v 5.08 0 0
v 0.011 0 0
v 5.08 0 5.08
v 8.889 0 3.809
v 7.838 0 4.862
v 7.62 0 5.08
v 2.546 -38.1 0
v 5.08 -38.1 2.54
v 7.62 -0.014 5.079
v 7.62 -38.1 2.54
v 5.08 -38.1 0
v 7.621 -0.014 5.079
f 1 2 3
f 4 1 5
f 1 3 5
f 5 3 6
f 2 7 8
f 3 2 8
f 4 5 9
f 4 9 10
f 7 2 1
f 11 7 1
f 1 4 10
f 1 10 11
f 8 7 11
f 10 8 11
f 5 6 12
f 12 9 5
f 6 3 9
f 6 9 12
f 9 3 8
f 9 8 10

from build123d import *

# Parameters (mm, degrees)
F0_W        = 10.16
F0_H        = 5.08
F1_DEPTH    = 38.1
F2_SIZE2    = 2.53999
F2_SIZE     = 38.09999
F3_T1_DEPTH = 64.3128613158
F4_T1_DEPTH = 13.0641595789
F4_T3_DEPTH = 44.702137425
F5_T1_DEPTH = 64.1438766671


# Not quite as in the source:
# - a fillet or chamfer that OpenCascade refuses, or shapes differently, is made with other operations: its cross-section is extruded or revolved along the edge and cut away or added
# - a fillet or chamfer is up to 0.001 mm smaller than in the source, because OpenCascade refuses the exact size


with BuildPart() as f1:
    # F0 (on Front) → F1 (new body)
    with BuildSketch(Plane.XZ):
        with Locations((5.08, 2.54)):
            Rectangle(F0_W, F0_H)
    extrude(amount=F1_DEPTH)

    # F2 (size 38.1 and 2.54 in the source; OpenCascade refuses exactly that, so slightly less here)
    f2_edges = [f1.edges().sort_by_distance(p)[0] for p in [
        (5.08, -38.1, 5.08),
    ]]
    f2_side = f1.faces().sort_by_distance((5.08, -19.05, 5.08))[0]
    chamfer(f2_edges, length=F2_SIZE, length2=F2_SIZE2, reference=f2_side)

    # F3: chamfer of 5.08 on 1 edges, made by hand

    # F3_s2 → F3_t1 (cut)
    with BuildSketch(Plane(origin=(0, 13.3723717196, 0.8914881722), x_dir=(1, 0, 0), z_dir=(0, -0.9977851741, -0.0665187672))):
        Polygon((0, -0.0112506505), (5.08, 5.0687493495), (0, 5.0687493495), align=None)
    extrude(amount=F3_T1_DEPTH, mode=Mode.SUBTRACT)

    # F4: chamfer of 2.54 on 2 edges, made by hand

    # F4_s2 → F4_t1 (cut)
    with BuildSketch(Plane.XZ.offset(-6.5320747894)):
        Polygon((7.62, 5.08), (10.16, 2.54), (10.16, 5.08), align=None)
    extrude(amount=F4_T1_DEPTH, mode=Mode.SUBTRACT)

    # F4_s4 → F4_t3 (cut)
    with BuildSketch(Plane(origin=(0, 0.3226895493, 0.0215125576), x_dir=(1, 0, 0), z_dir=(0, -0.9977851741, -0.0665187672))):
        Polygon((7.62, 5.0687493495), (10.16, 2.5287493495), (10.16, 5.0687493495), align=None)
    extrude(amount=F4_T3_DEPTH, mode=Mode.SUBTRACT)

    # F5: chamfer of 5.08 on 1 edges, made by hand

    # F5_s2 → F5_t1 (cut)
    with BuildSketch(Plane.XZ.offset(-13.0641495789)):
        Polygon((10.16, 5.08), (5.08, 0), (10.16, 0), align=None)
    extrude(amount=F5_T1_DEPTH, mode=Mode.SUBTRACT)


solid = f1.part
